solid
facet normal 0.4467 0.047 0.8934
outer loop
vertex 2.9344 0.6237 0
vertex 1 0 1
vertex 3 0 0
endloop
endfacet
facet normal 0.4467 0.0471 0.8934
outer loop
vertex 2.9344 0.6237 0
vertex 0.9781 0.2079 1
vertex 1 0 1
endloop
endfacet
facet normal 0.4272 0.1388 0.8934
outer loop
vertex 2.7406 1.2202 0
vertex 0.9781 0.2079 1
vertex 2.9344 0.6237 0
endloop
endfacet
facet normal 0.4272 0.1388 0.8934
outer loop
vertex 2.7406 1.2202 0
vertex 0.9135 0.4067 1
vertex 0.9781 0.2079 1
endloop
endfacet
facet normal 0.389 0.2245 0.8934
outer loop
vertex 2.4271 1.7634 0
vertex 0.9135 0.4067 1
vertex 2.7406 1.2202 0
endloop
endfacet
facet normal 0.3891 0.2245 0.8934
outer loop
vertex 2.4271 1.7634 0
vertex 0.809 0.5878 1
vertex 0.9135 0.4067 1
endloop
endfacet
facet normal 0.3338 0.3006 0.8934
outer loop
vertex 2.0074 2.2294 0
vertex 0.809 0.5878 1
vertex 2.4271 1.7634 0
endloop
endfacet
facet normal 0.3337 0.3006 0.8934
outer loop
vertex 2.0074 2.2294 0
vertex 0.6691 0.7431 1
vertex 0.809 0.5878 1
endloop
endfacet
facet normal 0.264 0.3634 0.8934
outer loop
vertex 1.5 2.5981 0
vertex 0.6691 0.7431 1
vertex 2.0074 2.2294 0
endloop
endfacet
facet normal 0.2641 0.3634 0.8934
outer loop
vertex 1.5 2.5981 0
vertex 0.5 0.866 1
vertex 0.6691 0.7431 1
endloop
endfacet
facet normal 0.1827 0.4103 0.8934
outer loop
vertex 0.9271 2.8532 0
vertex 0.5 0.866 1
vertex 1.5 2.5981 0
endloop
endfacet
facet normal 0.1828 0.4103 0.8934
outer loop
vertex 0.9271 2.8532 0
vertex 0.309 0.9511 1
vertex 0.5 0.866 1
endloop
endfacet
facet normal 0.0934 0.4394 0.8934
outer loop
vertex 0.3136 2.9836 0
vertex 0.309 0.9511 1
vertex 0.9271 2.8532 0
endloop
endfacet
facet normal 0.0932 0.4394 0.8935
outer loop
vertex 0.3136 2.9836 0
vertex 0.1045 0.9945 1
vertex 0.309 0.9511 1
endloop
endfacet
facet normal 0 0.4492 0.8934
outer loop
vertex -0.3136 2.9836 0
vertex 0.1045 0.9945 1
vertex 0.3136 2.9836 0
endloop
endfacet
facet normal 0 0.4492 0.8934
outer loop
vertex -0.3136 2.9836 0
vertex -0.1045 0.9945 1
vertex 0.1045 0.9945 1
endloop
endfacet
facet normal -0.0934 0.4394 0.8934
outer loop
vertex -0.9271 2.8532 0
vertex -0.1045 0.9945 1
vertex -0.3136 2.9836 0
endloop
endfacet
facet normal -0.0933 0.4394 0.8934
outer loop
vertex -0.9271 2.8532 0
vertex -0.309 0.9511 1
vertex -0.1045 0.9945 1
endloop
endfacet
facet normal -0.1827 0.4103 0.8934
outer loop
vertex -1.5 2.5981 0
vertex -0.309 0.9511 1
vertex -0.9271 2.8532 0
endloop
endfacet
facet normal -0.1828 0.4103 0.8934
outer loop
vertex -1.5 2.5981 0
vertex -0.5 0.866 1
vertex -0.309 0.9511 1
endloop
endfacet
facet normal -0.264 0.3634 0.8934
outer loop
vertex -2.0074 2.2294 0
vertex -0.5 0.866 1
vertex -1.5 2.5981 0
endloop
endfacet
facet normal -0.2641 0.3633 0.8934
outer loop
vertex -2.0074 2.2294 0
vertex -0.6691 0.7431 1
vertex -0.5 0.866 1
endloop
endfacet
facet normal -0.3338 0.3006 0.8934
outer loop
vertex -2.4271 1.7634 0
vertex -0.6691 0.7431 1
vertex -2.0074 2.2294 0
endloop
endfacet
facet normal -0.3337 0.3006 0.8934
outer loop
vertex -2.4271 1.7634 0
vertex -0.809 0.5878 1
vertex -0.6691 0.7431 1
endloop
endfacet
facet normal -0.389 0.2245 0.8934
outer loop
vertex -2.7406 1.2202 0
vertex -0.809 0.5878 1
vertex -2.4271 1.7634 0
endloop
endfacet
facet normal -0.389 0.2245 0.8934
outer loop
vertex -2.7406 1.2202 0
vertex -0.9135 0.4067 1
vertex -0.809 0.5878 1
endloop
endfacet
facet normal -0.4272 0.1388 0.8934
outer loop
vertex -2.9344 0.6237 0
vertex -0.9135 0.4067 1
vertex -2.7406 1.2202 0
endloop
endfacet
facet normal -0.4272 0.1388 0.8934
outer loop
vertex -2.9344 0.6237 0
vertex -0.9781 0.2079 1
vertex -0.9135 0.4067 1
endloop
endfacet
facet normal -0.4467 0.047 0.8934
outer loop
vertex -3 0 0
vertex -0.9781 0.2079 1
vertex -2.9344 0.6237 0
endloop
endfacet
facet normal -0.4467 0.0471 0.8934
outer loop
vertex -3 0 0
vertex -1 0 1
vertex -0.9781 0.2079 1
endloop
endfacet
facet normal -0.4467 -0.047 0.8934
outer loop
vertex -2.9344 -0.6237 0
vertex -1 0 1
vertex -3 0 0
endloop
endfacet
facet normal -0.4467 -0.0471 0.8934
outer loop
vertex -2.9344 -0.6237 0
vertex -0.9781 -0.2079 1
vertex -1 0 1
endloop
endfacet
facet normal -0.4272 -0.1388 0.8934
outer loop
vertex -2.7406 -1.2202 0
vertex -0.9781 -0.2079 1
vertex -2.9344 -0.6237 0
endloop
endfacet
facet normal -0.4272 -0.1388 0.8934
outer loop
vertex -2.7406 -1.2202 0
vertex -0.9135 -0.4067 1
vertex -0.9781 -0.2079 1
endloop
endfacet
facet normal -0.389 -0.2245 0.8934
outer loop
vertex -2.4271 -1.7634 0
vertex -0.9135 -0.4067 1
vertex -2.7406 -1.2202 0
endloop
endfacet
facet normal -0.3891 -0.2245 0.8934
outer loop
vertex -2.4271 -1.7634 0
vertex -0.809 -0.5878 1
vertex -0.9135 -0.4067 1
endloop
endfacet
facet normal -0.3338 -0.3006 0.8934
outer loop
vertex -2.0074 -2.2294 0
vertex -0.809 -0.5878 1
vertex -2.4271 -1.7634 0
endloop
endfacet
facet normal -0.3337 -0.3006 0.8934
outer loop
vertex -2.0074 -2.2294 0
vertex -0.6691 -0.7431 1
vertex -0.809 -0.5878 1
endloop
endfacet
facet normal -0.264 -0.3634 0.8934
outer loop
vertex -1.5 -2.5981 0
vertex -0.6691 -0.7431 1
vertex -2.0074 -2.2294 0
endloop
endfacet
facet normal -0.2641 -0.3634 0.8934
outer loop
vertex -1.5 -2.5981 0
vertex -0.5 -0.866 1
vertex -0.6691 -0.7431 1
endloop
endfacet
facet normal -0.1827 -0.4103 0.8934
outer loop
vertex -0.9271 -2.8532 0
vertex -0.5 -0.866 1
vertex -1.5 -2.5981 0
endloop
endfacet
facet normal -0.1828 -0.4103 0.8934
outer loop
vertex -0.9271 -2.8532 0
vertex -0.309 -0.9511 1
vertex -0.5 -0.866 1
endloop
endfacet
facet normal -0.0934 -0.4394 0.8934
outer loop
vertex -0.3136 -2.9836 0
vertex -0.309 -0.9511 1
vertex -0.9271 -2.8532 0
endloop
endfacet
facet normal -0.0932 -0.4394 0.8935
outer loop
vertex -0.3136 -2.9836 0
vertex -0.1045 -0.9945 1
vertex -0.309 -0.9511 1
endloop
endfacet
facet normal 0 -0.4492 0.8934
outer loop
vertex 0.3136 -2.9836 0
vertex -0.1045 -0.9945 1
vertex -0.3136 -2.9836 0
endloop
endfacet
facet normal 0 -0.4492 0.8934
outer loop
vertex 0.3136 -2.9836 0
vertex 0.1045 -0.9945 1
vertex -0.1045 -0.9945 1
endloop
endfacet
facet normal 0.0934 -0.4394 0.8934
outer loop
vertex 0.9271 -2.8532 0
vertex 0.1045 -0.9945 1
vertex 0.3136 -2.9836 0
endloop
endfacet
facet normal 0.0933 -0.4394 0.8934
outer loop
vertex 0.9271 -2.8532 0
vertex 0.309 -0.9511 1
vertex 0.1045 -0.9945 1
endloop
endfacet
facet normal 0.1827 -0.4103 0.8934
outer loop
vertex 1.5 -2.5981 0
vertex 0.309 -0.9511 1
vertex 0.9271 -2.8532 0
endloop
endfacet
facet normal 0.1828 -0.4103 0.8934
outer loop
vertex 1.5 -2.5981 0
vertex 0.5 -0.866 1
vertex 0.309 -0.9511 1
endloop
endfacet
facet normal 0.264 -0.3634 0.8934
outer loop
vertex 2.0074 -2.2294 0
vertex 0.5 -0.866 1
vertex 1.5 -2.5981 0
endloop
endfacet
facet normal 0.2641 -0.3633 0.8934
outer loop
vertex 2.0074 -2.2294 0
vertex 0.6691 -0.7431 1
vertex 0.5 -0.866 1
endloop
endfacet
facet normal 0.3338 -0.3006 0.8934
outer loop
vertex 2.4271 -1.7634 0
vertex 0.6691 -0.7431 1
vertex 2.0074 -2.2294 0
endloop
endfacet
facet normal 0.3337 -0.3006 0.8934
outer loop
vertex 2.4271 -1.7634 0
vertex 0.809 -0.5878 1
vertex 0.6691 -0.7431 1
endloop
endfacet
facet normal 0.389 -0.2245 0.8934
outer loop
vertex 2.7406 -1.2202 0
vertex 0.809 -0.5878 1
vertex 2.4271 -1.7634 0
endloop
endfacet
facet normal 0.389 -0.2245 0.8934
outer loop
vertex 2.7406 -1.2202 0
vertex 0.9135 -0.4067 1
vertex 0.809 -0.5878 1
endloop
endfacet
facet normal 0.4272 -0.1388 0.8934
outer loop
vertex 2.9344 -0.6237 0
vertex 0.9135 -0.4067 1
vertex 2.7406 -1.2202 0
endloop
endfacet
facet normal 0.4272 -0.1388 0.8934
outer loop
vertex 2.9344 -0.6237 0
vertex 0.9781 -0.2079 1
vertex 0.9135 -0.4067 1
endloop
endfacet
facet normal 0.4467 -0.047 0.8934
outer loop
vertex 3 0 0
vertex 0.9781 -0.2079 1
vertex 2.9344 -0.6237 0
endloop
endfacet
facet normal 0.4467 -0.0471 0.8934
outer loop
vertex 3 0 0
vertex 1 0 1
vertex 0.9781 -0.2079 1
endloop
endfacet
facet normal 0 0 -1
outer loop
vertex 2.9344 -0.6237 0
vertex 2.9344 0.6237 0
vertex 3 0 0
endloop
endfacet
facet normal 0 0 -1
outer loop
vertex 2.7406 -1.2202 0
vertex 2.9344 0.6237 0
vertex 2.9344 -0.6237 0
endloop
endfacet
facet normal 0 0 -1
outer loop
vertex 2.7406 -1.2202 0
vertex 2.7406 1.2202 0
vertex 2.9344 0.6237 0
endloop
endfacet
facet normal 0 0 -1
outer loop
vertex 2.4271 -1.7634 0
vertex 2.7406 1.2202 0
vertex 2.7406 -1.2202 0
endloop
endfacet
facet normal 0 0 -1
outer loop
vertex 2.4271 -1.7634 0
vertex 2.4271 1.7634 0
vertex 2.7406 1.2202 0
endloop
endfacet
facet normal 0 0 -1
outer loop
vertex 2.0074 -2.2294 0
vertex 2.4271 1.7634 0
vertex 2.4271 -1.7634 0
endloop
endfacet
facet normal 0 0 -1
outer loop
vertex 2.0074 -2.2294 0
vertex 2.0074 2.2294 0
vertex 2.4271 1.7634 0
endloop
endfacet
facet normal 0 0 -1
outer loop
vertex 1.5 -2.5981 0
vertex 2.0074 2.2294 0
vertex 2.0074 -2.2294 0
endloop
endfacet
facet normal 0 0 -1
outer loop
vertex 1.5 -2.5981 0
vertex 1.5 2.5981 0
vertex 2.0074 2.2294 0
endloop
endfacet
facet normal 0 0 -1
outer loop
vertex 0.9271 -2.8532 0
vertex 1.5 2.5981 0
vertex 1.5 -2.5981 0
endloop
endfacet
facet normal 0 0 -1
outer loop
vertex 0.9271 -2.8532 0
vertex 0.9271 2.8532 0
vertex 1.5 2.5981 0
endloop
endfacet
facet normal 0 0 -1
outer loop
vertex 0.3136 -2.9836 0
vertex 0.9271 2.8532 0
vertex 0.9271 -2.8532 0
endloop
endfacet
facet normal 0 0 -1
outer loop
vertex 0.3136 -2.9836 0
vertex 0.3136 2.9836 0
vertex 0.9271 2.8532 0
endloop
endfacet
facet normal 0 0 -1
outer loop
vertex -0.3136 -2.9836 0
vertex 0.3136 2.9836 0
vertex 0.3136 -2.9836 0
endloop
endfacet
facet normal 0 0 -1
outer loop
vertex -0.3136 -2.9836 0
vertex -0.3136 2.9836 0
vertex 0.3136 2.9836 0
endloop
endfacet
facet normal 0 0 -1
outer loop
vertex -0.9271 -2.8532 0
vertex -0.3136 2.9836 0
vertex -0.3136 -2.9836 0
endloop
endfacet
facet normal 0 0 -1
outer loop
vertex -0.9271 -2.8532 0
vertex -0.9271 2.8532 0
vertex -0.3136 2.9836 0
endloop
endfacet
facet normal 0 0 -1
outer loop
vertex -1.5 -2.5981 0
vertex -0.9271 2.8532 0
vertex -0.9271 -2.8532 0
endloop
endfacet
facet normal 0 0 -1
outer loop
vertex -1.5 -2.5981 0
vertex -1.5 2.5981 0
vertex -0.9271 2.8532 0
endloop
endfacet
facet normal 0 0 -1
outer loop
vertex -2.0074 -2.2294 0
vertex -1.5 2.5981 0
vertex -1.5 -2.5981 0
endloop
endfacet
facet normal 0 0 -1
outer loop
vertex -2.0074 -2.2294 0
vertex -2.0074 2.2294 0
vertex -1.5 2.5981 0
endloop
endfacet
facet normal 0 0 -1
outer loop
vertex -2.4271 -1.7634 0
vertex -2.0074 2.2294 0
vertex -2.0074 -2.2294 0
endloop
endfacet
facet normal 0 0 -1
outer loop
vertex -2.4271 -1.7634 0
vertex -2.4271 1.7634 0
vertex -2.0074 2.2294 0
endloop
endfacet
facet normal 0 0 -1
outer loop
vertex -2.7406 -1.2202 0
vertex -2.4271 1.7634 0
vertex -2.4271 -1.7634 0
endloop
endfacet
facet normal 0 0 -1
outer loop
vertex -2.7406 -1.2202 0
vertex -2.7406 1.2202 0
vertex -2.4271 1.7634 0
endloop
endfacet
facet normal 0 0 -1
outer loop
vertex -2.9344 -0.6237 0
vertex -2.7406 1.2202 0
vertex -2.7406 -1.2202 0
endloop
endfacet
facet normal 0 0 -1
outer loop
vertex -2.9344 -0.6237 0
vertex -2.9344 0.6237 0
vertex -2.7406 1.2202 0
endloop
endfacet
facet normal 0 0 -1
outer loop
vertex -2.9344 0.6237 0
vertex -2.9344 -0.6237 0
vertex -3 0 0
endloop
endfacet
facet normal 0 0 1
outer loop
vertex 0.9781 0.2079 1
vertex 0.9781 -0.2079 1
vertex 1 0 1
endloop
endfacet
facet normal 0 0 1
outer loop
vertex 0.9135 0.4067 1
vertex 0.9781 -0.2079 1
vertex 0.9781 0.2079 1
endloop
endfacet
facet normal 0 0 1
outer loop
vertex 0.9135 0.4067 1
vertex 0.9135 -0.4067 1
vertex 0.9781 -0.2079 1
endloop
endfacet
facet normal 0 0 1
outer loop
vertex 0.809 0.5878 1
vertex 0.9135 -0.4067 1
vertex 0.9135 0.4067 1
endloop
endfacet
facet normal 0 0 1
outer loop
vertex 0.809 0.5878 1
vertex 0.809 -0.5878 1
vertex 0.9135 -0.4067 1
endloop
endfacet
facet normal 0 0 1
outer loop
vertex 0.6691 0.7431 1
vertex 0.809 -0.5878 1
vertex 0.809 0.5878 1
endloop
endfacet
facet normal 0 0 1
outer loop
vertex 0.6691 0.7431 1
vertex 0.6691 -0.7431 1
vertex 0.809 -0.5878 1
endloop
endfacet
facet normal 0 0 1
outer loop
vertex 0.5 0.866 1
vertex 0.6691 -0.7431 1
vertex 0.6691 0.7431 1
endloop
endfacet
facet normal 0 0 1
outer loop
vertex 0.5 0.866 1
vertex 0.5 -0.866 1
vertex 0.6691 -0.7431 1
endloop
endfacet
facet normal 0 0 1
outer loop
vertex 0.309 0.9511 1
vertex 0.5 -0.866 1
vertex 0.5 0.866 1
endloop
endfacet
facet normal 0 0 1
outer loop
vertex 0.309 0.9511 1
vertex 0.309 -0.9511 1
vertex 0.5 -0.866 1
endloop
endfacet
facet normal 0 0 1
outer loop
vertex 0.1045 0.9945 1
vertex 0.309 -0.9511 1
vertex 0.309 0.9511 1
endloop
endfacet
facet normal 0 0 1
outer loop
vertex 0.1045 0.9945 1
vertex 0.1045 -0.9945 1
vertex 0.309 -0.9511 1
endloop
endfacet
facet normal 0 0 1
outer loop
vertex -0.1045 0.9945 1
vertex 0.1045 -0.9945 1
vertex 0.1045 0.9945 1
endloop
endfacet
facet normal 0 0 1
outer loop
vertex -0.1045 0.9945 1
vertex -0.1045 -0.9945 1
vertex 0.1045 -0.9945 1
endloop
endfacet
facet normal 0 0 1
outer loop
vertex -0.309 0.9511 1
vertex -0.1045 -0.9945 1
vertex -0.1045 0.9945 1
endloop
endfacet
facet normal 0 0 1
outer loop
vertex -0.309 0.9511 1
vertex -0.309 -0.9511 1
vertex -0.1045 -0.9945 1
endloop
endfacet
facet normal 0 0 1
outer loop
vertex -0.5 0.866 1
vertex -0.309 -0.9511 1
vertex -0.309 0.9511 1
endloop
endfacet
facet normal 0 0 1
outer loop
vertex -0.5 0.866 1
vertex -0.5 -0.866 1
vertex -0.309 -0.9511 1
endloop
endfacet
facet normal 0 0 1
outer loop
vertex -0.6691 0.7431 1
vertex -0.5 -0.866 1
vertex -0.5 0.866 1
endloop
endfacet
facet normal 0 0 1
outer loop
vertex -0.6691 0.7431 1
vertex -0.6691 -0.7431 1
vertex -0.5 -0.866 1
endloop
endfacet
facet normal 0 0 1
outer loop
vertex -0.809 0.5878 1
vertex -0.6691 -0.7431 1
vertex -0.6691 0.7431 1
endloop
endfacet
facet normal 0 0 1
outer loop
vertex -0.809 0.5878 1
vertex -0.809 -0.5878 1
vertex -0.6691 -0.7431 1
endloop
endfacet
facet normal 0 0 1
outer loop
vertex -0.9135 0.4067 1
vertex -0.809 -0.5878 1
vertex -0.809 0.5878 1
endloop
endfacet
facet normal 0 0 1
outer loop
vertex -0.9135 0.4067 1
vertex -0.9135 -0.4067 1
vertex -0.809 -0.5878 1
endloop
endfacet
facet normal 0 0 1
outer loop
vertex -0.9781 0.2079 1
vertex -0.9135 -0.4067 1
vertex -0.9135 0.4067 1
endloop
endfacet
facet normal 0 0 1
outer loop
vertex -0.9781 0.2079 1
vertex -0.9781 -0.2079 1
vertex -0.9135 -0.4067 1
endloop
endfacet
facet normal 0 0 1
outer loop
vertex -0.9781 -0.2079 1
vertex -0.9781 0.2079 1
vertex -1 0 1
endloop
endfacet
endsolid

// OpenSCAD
/*
 * OpenSCAD Workshop Examples
 * Copyright (c) 2013 Anar Software LLC. < http://anars.com >
 *
 * This program is free software: you can redistribute it and/or modify it under
 * the terms of the GNU General Public License as published by the Free Software
 * Foundation, either version 3 of the License, or (at your option) any later
 * version.
 *
 * This program is distributed in the hope that it will be useful, but WITHOUT
 * ANY WARRANTY; without even the implied warranty of MERCHANTABILITY or FITNESS
 * FOR A PARTICULAR PURPOSE. See the GNU General Public License for more details.
 *
 * You should have received a copy of the GNU General Public License along with
 * this program. If not, see < http://www.gnu.org/licenses/ >
 *
 */
/*

Creates a cone with bottom end radius is 3 unit radius, top end radius 1 unit and 1 unit height.

Parameters :

	cylinder(r1 = x);

*/

$fs = 0;

cylinder(r1 = 3);
